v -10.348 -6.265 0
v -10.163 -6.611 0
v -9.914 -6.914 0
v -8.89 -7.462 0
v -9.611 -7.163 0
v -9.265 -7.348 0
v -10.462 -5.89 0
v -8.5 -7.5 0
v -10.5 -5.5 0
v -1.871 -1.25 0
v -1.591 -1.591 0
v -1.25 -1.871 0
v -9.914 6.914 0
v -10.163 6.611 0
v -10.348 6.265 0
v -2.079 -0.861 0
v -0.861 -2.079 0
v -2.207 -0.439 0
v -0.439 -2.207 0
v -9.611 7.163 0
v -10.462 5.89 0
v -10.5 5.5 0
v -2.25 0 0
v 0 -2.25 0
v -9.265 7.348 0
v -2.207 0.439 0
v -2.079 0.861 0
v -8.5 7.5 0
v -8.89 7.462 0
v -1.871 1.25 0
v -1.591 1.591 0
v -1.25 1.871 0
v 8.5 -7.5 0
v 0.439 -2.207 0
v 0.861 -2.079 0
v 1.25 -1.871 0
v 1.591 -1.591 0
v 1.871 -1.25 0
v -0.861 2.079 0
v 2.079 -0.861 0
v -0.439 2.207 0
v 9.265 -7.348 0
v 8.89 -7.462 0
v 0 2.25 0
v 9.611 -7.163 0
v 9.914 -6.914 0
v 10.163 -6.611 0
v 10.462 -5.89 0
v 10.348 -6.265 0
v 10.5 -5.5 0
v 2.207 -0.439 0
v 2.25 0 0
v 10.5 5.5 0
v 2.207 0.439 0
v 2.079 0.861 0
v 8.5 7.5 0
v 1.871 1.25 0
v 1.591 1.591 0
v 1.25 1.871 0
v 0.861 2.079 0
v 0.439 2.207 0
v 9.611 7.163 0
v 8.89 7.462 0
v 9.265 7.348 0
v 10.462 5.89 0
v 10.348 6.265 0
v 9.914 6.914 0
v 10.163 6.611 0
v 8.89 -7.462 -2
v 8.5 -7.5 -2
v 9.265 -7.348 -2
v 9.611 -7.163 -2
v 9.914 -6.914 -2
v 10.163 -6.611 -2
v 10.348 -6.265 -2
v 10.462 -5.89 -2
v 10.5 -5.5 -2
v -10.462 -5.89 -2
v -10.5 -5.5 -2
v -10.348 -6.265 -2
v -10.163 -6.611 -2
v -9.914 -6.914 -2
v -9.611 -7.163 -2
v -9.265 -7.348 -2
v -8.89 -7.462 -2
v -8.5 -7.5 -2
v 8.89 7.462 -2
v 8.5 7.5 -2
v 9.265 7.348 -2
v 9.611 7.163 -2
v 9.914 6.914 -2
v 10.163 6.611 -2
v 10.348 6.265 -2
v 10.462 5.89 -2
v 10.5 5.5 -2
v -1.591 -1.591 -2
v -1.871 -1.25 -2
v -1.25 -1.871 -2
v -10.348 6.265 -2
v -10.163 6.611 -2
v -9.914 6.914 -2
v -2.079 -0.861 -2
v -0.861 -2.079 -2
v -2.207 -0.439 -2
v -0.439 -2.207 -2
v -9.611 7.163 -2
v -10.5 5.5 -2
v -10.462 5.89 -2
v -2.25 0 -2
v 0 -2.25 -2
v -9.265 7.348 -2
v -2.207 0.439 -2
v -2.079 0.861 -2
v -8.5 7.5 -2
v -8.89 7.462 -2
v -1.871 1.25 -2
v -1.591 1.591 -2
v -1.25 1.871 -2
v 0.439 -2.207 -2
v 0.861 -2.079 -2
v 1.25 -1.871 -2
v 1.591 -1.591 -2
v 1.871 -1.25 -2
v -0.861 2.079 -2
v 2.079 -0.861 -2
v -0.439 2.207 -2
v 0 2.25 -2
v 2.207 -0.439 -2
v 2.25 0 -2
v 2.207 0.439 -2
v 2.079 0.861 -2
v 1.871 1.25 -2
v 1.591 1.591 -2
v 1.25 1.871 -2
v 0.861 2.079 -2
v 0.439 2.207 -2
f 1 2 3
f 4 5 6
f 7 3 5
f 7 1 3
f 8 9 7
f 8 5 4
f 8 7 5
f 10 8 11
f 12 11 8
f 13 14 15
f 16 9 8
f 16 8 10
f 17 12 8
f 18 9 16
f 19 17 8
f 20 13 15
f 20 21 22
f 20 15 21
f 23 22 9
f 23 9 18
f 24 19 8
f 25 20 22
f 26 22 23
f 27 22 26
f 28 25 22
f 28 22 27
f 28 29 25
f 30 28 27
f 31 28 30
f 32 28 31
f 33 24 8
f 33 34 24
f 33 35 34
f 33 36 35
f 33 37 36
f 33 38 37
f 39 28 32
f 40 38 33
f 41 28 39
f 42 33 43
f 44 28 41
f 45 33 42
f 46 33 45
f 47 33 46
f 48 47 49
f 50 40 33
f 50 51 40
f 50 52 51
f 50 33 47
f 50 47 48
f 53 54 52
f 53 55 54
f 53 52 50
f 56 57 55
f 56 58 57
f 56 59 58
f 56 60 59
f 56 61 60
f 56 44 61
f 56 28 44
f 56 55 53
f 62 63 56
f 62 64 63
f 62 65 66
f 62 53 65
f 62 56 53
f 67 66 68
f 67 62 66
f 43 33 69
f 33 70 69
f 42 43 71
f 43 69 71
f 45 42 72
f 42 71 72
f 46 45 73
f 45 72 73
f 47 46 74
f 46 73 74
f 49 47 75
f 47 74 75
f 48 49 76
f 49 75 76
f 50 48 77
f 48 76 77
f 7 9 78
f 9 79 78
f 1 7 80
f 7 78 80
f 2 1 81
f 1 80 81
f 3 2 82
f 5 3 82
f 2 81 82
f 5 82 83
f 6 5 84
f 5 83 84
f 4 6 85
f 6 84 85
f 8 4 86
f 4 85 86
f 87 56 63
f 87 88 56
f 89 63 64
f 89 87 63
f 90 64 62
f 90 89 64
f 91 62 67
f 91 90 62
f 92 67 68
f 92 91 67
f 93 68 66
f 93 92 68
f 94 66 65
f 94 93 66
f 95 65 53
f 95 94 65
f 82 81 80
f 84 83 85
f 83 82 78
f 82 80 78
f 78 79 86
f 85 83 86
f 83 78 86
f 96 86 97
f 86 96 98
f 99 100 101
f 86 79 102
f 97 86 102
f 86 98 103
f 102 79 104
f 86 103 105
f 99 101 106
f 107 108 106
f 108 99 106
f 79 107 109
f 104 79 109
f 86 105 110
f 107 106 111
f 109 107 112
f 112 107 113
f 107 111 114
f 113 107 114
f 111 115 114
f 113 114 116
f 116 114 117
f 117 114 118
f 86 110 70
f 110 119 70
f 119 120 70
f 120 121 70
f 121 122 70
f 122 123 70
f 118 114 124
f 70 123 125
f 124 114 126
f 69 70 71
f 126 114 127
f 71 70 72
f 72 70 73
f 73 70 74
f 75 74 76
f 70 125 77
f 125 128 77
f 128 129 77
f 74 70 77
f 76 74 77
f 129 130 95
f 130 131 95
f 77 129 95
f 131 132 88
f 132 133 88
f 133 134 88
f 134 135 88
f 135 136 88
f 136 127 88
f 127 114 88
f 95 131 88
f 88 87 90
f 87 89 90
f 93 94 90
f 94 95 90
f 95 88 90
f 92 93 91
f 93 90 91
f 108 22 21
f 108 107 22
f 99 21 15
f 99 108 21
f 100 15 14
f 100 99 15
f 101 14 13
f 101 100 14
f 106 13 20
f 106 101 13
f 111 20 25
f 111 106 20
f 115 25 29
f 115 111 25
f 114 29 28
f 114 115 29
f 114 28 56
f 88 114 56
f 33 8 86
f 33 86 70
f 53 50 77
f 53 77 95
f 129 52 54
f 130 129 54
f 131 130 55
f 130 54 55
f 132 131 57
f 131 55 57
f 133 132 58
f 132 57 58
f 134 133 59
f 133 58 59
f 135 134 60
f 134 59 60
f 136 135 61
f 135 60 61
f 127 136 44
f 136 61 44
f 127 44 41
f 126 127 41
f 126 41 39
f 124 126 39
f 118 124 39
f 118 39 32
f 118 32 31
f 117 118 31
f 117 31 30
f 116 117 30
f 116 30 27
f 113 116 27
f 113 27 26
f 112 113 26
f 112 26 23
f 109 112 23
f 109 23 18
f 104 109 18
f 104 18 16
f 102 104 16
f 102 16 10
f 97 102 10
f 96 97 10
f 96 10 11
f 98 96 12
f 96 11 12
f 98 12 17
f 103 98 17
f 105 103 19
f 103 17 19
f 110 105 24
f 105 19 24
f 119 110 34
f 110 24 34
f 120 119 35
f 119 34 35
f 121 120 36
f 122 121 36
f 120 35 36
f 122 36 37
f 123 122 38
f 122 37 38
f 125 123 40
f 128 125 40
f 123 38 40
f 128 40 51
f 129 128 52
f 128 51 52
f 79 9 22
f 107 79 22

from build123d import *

# Parameters (mm, degrees)
SKETCH1_W           = 21
SKETCH1_H           = 15
BOSS_EXTRUDE1_DEPTH = 2
SKETCH2_R           = 2.25
CUT_EXTRUDE1_DEPTH  = 14.057564857
FILLET1_R           = 2


with BuildPart() as part:
    # Sketch1 → Boss-Extrude1 (new body)
    with BuildSketch(Plane.XY):
        Rectangle(SKETCH1_W, SKETCH1_H)
    extrude(amount=-BOSS_EXTRUDE1_DEPTH)

    # Sketch2 → Cut-Extrude1 (cut, through all)
    with BuildSketch(Plane.XY):
        Circle(SKETCH2_R)
    extrude(amount=-CUT_EXTRUDE1_DEPTH, mode=Mode.SUBTRACT)

    # Fillet1
    fillet1_edges = [part.edges().sort_by_distance(p)[0] for p in [
        (10.5, -7.5, -1),
        (-10.5, -7.5, -1),
        (-10.5, 7.5, -1),
        (10.5, 7.5, -1),
    ]]
    fillet(fillet1_edges, radius=FILLET1_R)


solid = part.part
